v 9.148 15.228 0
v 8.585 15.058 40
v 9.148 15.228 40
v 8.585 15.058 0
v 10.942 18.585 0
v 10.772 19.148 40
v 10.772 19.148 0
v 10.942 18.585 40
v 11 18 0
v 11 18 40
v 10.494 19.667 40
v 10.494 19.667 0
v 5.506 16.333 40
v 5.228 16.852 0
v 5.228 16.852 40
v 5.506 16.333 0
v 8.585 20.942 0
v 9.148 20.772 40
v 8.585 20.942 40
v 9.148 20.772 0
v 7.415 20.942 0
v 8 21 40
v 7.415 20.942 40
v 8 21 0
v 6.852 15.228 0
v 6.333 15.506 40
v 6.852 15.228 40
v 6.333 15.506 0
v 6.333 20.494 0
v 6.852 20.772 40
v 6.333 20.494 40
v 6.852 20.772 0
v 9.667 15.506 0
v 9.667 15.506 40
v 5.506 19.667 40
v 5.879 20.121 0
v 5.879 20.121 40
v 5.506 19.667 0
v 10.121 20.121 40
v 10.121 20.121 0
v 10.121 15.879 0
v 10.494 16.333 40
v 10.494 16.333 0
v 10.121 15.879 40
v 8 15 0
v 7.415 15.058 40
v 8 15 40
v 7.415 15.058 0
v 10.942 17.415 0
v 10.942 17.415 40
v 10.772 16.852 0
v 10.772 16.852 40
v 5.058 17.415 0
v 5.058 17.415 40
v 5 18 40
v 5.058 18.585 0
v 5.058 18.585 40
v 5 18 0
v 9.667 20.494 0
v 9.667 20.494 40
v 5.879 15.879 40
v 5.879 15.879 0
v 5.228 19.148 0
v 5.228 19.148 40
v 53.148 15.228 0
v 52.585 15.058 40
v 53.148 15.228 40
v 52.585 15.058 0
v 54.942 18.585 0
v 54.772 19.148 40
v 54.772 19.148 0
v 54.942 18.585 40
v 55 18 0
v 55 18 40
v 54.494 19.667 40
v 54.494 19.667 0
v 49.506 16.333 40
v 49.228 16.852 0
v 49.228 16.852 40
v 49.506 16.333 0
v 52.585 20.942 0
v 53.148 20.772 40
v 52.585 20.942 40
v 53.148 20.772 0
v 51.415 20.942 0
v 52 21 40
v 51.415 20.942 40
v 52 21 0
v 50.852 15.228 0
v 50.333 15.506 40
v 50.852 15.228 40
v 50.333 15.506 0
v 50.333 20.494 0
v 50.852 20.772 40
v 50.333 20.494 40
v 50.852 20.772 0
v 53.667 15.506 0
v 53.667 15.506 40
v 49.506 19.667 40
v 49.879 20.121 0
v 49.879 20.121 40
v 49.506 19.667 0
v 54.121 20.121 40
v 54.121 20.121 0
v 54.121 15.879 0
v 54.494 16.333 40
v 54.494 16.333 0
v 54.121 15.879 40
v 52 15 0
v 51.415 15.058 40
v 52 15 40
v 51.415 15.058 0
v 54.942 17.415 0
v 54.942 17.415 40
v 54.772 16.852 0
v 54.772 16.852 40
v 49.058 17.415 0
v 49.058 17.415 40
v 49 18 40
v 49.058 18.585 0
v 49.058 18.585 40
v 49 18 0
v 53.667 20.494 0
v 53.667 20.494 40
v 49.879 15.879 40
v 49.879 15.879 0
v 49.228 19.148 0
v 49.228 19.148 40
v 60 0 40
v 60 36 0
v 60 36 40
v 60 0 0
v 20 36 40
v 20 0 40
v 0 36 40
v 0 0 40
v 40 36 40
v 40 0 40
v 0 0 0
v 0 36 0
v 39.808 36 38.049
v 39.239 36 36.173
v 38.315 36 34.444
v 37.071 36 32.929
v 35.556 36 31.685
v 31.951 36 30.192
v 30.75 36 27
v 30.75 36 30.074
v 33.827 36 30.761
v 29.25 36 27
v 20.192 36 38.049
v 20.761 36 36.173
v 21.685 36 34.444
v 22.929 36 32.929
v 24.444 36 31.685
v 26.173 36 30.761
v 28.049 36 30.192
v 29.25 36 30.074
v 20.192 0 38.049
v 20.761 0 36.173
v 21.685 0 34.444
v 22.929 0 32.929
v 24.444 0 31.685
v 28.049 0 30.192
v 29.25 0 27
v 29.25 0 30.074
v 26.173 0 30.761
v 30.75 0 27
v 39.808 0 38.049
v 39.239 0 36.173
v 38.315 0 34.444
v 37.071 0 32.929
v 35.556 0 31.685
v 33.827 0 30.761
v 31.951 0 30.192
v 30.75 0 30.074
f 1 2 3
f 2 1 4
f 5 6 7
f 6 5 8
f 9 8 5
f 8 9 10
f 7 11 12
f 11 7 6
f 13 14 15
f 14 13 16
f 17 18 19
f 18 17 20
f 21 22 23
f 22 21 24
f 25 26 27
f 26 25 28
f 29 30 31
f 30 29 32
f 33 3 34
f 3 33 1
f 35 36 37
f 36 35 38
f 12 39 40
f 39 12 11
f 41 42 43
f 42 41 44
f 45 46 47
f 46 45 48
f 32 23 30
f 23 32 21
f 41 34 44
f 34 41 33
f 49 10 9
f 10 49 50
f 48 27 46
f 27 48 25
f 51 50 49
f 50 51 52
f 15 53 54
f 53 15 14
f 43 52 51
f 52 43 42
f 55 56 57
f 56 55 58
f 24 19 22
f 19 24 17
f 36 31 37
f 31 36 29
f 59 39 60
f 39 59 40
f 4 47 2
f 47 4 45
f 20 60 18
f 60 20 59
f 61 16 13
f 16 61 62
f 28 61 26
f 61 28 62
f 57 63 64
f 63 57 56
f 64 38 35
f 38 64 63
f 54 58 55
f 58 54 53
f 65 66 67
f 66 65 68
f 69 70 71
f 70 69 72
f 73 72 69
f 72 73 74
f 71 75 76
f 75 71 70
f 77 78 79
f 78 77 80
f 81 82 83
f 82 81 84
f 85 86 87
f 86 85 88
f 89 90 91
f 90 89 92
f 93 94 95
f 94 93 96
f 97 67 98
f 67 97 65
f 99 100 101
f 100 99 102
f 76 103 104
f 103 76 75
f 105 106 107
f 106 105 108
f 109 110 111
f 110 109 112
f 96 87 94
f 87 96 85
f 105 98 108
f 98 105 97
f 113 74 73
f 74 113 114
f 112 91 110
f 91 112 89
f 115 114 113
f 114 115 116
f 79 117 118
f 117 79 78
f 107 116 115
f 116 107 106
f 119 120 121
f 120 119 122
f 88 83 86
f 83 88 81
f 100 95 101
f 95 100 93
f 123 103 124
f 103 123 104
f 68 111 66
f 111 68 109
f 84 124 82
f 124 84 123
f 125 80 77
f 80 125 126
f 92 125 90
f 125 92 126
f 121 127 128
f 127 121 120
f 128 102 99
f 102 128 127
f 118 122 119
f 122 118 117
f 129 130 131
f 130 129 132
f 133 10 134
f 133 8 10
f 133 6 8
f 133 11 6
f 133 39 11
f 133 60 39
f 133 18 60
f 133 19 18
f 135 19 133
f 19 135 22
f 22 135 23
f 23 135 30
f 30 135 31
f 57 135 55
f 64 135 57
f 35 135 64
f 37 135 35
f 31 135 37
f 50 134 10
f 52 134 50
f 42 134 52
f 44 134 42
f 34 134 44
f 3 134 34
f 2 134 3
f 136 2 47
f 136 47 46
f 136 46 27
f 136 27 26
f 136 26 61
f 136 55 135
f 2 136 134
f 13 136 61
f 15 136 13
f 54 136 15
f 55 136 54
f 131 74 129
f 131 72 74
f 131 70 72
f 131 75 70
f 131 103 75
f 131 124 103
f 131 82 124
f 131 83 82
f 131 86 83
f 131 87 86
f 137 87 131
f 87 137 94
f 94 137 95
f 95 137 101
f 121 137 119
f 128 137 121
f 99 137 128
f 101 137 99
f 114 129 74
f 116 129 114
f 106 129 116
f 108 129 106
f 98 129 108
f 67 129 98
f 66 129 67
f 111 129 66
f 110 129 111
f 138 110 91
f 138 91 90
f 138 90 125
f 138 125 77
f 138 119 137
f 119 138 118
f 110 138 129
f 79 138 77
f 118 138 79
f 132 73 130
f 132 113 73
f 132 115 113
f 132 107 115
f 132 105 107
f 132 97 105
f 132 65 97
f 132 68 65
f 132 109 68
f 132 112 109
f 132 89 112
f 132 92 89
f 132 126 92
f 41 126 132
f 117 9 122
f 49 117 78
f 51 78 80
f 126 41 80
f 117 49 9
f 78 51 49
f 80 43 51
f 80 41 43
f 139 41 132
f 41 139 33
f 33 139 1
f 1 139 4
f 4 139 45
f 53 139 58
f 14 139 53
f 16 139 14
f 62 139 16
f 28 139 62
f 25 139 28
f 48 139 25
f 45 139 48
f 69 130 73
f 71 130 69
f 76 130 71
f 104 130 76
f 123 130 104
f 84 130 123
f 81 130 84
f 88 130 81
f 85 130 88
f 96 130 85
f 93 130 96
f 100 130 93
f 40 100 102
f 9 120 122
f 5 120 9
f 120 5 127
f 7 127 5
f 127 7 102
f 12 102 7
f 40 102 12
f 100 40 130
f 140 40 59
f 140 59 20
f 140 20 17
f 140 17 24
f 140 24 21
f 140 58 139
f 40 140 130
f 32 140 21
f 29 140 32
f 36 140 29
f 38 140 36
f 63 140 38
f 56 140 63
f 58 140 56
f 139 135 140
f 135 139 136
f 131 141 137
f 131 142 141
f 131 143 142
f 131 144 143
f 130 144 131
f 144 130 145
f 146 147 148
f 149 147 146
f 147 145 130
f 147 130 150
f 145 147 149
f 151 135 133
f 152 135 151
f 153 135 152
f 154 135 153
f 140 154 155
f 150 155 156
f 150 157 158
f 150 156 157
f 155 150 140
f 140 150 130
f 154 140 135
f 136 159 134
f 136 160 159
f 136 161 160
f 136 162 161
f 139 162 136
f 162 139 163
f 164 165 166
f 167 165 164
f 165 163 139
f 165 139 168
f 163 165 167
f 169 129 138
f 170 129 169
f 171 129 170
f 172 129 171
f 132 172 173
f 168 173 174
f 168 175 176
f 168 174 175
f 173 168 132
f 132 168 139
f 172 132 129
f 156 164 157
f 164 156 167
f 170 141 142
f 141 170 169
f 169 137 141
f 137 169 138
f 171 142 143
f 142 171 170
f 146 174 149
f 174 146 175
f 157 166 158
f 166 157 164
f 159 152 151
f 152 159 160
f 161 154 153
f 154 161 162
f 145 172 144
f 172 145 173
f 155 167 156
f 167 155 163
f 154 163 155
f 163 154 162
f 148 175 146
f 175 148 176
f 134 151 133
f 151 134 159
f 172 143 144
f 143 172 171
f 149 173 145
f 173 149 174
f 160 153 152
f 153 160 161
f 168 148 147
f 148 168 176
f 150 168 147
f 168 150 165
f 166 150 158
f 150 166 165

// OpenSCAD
$fn = 32;

// ----------------------------------------------------------------------
// Saddle clamp: split shaft clamp
// ----------------------------------------------------------------------

// --- parameters (mm) ---
blk_l = 60;               // block length, X
blk_w = 36;               // block width, Y
blk_h = 40;               // block height
clamp_r = 10;             // shaft groove radius
hole_r = 3;               // bolt hole radius
hole_m = 8;               // bolt hole margin from the ends
saw_w = 1.5;              // saw kerf width

saw_depth = clamp_r + 3;  // saw kerf depth

difference() {
  cube([blk_l, blk_w, blk_h]);
  translate([blk_l / 2, -1, blk_h])
    rotate([-90, 0, 0])
      cylinder(h = blk_w + 2, r = clamp_r);
  for (sx = [0, 1])
    translate([sx ? blk_l - hole_m : hole_m, blk_w / 2, -1])
      cylinder(r = hole_r, h = blk_h + 2);
  translate([blk_l / 2 - saw_w / 2, -1, blk_h - saw_depth])
    cube([saw_w, blk_w + 2, saw_depth + 1]);
}
